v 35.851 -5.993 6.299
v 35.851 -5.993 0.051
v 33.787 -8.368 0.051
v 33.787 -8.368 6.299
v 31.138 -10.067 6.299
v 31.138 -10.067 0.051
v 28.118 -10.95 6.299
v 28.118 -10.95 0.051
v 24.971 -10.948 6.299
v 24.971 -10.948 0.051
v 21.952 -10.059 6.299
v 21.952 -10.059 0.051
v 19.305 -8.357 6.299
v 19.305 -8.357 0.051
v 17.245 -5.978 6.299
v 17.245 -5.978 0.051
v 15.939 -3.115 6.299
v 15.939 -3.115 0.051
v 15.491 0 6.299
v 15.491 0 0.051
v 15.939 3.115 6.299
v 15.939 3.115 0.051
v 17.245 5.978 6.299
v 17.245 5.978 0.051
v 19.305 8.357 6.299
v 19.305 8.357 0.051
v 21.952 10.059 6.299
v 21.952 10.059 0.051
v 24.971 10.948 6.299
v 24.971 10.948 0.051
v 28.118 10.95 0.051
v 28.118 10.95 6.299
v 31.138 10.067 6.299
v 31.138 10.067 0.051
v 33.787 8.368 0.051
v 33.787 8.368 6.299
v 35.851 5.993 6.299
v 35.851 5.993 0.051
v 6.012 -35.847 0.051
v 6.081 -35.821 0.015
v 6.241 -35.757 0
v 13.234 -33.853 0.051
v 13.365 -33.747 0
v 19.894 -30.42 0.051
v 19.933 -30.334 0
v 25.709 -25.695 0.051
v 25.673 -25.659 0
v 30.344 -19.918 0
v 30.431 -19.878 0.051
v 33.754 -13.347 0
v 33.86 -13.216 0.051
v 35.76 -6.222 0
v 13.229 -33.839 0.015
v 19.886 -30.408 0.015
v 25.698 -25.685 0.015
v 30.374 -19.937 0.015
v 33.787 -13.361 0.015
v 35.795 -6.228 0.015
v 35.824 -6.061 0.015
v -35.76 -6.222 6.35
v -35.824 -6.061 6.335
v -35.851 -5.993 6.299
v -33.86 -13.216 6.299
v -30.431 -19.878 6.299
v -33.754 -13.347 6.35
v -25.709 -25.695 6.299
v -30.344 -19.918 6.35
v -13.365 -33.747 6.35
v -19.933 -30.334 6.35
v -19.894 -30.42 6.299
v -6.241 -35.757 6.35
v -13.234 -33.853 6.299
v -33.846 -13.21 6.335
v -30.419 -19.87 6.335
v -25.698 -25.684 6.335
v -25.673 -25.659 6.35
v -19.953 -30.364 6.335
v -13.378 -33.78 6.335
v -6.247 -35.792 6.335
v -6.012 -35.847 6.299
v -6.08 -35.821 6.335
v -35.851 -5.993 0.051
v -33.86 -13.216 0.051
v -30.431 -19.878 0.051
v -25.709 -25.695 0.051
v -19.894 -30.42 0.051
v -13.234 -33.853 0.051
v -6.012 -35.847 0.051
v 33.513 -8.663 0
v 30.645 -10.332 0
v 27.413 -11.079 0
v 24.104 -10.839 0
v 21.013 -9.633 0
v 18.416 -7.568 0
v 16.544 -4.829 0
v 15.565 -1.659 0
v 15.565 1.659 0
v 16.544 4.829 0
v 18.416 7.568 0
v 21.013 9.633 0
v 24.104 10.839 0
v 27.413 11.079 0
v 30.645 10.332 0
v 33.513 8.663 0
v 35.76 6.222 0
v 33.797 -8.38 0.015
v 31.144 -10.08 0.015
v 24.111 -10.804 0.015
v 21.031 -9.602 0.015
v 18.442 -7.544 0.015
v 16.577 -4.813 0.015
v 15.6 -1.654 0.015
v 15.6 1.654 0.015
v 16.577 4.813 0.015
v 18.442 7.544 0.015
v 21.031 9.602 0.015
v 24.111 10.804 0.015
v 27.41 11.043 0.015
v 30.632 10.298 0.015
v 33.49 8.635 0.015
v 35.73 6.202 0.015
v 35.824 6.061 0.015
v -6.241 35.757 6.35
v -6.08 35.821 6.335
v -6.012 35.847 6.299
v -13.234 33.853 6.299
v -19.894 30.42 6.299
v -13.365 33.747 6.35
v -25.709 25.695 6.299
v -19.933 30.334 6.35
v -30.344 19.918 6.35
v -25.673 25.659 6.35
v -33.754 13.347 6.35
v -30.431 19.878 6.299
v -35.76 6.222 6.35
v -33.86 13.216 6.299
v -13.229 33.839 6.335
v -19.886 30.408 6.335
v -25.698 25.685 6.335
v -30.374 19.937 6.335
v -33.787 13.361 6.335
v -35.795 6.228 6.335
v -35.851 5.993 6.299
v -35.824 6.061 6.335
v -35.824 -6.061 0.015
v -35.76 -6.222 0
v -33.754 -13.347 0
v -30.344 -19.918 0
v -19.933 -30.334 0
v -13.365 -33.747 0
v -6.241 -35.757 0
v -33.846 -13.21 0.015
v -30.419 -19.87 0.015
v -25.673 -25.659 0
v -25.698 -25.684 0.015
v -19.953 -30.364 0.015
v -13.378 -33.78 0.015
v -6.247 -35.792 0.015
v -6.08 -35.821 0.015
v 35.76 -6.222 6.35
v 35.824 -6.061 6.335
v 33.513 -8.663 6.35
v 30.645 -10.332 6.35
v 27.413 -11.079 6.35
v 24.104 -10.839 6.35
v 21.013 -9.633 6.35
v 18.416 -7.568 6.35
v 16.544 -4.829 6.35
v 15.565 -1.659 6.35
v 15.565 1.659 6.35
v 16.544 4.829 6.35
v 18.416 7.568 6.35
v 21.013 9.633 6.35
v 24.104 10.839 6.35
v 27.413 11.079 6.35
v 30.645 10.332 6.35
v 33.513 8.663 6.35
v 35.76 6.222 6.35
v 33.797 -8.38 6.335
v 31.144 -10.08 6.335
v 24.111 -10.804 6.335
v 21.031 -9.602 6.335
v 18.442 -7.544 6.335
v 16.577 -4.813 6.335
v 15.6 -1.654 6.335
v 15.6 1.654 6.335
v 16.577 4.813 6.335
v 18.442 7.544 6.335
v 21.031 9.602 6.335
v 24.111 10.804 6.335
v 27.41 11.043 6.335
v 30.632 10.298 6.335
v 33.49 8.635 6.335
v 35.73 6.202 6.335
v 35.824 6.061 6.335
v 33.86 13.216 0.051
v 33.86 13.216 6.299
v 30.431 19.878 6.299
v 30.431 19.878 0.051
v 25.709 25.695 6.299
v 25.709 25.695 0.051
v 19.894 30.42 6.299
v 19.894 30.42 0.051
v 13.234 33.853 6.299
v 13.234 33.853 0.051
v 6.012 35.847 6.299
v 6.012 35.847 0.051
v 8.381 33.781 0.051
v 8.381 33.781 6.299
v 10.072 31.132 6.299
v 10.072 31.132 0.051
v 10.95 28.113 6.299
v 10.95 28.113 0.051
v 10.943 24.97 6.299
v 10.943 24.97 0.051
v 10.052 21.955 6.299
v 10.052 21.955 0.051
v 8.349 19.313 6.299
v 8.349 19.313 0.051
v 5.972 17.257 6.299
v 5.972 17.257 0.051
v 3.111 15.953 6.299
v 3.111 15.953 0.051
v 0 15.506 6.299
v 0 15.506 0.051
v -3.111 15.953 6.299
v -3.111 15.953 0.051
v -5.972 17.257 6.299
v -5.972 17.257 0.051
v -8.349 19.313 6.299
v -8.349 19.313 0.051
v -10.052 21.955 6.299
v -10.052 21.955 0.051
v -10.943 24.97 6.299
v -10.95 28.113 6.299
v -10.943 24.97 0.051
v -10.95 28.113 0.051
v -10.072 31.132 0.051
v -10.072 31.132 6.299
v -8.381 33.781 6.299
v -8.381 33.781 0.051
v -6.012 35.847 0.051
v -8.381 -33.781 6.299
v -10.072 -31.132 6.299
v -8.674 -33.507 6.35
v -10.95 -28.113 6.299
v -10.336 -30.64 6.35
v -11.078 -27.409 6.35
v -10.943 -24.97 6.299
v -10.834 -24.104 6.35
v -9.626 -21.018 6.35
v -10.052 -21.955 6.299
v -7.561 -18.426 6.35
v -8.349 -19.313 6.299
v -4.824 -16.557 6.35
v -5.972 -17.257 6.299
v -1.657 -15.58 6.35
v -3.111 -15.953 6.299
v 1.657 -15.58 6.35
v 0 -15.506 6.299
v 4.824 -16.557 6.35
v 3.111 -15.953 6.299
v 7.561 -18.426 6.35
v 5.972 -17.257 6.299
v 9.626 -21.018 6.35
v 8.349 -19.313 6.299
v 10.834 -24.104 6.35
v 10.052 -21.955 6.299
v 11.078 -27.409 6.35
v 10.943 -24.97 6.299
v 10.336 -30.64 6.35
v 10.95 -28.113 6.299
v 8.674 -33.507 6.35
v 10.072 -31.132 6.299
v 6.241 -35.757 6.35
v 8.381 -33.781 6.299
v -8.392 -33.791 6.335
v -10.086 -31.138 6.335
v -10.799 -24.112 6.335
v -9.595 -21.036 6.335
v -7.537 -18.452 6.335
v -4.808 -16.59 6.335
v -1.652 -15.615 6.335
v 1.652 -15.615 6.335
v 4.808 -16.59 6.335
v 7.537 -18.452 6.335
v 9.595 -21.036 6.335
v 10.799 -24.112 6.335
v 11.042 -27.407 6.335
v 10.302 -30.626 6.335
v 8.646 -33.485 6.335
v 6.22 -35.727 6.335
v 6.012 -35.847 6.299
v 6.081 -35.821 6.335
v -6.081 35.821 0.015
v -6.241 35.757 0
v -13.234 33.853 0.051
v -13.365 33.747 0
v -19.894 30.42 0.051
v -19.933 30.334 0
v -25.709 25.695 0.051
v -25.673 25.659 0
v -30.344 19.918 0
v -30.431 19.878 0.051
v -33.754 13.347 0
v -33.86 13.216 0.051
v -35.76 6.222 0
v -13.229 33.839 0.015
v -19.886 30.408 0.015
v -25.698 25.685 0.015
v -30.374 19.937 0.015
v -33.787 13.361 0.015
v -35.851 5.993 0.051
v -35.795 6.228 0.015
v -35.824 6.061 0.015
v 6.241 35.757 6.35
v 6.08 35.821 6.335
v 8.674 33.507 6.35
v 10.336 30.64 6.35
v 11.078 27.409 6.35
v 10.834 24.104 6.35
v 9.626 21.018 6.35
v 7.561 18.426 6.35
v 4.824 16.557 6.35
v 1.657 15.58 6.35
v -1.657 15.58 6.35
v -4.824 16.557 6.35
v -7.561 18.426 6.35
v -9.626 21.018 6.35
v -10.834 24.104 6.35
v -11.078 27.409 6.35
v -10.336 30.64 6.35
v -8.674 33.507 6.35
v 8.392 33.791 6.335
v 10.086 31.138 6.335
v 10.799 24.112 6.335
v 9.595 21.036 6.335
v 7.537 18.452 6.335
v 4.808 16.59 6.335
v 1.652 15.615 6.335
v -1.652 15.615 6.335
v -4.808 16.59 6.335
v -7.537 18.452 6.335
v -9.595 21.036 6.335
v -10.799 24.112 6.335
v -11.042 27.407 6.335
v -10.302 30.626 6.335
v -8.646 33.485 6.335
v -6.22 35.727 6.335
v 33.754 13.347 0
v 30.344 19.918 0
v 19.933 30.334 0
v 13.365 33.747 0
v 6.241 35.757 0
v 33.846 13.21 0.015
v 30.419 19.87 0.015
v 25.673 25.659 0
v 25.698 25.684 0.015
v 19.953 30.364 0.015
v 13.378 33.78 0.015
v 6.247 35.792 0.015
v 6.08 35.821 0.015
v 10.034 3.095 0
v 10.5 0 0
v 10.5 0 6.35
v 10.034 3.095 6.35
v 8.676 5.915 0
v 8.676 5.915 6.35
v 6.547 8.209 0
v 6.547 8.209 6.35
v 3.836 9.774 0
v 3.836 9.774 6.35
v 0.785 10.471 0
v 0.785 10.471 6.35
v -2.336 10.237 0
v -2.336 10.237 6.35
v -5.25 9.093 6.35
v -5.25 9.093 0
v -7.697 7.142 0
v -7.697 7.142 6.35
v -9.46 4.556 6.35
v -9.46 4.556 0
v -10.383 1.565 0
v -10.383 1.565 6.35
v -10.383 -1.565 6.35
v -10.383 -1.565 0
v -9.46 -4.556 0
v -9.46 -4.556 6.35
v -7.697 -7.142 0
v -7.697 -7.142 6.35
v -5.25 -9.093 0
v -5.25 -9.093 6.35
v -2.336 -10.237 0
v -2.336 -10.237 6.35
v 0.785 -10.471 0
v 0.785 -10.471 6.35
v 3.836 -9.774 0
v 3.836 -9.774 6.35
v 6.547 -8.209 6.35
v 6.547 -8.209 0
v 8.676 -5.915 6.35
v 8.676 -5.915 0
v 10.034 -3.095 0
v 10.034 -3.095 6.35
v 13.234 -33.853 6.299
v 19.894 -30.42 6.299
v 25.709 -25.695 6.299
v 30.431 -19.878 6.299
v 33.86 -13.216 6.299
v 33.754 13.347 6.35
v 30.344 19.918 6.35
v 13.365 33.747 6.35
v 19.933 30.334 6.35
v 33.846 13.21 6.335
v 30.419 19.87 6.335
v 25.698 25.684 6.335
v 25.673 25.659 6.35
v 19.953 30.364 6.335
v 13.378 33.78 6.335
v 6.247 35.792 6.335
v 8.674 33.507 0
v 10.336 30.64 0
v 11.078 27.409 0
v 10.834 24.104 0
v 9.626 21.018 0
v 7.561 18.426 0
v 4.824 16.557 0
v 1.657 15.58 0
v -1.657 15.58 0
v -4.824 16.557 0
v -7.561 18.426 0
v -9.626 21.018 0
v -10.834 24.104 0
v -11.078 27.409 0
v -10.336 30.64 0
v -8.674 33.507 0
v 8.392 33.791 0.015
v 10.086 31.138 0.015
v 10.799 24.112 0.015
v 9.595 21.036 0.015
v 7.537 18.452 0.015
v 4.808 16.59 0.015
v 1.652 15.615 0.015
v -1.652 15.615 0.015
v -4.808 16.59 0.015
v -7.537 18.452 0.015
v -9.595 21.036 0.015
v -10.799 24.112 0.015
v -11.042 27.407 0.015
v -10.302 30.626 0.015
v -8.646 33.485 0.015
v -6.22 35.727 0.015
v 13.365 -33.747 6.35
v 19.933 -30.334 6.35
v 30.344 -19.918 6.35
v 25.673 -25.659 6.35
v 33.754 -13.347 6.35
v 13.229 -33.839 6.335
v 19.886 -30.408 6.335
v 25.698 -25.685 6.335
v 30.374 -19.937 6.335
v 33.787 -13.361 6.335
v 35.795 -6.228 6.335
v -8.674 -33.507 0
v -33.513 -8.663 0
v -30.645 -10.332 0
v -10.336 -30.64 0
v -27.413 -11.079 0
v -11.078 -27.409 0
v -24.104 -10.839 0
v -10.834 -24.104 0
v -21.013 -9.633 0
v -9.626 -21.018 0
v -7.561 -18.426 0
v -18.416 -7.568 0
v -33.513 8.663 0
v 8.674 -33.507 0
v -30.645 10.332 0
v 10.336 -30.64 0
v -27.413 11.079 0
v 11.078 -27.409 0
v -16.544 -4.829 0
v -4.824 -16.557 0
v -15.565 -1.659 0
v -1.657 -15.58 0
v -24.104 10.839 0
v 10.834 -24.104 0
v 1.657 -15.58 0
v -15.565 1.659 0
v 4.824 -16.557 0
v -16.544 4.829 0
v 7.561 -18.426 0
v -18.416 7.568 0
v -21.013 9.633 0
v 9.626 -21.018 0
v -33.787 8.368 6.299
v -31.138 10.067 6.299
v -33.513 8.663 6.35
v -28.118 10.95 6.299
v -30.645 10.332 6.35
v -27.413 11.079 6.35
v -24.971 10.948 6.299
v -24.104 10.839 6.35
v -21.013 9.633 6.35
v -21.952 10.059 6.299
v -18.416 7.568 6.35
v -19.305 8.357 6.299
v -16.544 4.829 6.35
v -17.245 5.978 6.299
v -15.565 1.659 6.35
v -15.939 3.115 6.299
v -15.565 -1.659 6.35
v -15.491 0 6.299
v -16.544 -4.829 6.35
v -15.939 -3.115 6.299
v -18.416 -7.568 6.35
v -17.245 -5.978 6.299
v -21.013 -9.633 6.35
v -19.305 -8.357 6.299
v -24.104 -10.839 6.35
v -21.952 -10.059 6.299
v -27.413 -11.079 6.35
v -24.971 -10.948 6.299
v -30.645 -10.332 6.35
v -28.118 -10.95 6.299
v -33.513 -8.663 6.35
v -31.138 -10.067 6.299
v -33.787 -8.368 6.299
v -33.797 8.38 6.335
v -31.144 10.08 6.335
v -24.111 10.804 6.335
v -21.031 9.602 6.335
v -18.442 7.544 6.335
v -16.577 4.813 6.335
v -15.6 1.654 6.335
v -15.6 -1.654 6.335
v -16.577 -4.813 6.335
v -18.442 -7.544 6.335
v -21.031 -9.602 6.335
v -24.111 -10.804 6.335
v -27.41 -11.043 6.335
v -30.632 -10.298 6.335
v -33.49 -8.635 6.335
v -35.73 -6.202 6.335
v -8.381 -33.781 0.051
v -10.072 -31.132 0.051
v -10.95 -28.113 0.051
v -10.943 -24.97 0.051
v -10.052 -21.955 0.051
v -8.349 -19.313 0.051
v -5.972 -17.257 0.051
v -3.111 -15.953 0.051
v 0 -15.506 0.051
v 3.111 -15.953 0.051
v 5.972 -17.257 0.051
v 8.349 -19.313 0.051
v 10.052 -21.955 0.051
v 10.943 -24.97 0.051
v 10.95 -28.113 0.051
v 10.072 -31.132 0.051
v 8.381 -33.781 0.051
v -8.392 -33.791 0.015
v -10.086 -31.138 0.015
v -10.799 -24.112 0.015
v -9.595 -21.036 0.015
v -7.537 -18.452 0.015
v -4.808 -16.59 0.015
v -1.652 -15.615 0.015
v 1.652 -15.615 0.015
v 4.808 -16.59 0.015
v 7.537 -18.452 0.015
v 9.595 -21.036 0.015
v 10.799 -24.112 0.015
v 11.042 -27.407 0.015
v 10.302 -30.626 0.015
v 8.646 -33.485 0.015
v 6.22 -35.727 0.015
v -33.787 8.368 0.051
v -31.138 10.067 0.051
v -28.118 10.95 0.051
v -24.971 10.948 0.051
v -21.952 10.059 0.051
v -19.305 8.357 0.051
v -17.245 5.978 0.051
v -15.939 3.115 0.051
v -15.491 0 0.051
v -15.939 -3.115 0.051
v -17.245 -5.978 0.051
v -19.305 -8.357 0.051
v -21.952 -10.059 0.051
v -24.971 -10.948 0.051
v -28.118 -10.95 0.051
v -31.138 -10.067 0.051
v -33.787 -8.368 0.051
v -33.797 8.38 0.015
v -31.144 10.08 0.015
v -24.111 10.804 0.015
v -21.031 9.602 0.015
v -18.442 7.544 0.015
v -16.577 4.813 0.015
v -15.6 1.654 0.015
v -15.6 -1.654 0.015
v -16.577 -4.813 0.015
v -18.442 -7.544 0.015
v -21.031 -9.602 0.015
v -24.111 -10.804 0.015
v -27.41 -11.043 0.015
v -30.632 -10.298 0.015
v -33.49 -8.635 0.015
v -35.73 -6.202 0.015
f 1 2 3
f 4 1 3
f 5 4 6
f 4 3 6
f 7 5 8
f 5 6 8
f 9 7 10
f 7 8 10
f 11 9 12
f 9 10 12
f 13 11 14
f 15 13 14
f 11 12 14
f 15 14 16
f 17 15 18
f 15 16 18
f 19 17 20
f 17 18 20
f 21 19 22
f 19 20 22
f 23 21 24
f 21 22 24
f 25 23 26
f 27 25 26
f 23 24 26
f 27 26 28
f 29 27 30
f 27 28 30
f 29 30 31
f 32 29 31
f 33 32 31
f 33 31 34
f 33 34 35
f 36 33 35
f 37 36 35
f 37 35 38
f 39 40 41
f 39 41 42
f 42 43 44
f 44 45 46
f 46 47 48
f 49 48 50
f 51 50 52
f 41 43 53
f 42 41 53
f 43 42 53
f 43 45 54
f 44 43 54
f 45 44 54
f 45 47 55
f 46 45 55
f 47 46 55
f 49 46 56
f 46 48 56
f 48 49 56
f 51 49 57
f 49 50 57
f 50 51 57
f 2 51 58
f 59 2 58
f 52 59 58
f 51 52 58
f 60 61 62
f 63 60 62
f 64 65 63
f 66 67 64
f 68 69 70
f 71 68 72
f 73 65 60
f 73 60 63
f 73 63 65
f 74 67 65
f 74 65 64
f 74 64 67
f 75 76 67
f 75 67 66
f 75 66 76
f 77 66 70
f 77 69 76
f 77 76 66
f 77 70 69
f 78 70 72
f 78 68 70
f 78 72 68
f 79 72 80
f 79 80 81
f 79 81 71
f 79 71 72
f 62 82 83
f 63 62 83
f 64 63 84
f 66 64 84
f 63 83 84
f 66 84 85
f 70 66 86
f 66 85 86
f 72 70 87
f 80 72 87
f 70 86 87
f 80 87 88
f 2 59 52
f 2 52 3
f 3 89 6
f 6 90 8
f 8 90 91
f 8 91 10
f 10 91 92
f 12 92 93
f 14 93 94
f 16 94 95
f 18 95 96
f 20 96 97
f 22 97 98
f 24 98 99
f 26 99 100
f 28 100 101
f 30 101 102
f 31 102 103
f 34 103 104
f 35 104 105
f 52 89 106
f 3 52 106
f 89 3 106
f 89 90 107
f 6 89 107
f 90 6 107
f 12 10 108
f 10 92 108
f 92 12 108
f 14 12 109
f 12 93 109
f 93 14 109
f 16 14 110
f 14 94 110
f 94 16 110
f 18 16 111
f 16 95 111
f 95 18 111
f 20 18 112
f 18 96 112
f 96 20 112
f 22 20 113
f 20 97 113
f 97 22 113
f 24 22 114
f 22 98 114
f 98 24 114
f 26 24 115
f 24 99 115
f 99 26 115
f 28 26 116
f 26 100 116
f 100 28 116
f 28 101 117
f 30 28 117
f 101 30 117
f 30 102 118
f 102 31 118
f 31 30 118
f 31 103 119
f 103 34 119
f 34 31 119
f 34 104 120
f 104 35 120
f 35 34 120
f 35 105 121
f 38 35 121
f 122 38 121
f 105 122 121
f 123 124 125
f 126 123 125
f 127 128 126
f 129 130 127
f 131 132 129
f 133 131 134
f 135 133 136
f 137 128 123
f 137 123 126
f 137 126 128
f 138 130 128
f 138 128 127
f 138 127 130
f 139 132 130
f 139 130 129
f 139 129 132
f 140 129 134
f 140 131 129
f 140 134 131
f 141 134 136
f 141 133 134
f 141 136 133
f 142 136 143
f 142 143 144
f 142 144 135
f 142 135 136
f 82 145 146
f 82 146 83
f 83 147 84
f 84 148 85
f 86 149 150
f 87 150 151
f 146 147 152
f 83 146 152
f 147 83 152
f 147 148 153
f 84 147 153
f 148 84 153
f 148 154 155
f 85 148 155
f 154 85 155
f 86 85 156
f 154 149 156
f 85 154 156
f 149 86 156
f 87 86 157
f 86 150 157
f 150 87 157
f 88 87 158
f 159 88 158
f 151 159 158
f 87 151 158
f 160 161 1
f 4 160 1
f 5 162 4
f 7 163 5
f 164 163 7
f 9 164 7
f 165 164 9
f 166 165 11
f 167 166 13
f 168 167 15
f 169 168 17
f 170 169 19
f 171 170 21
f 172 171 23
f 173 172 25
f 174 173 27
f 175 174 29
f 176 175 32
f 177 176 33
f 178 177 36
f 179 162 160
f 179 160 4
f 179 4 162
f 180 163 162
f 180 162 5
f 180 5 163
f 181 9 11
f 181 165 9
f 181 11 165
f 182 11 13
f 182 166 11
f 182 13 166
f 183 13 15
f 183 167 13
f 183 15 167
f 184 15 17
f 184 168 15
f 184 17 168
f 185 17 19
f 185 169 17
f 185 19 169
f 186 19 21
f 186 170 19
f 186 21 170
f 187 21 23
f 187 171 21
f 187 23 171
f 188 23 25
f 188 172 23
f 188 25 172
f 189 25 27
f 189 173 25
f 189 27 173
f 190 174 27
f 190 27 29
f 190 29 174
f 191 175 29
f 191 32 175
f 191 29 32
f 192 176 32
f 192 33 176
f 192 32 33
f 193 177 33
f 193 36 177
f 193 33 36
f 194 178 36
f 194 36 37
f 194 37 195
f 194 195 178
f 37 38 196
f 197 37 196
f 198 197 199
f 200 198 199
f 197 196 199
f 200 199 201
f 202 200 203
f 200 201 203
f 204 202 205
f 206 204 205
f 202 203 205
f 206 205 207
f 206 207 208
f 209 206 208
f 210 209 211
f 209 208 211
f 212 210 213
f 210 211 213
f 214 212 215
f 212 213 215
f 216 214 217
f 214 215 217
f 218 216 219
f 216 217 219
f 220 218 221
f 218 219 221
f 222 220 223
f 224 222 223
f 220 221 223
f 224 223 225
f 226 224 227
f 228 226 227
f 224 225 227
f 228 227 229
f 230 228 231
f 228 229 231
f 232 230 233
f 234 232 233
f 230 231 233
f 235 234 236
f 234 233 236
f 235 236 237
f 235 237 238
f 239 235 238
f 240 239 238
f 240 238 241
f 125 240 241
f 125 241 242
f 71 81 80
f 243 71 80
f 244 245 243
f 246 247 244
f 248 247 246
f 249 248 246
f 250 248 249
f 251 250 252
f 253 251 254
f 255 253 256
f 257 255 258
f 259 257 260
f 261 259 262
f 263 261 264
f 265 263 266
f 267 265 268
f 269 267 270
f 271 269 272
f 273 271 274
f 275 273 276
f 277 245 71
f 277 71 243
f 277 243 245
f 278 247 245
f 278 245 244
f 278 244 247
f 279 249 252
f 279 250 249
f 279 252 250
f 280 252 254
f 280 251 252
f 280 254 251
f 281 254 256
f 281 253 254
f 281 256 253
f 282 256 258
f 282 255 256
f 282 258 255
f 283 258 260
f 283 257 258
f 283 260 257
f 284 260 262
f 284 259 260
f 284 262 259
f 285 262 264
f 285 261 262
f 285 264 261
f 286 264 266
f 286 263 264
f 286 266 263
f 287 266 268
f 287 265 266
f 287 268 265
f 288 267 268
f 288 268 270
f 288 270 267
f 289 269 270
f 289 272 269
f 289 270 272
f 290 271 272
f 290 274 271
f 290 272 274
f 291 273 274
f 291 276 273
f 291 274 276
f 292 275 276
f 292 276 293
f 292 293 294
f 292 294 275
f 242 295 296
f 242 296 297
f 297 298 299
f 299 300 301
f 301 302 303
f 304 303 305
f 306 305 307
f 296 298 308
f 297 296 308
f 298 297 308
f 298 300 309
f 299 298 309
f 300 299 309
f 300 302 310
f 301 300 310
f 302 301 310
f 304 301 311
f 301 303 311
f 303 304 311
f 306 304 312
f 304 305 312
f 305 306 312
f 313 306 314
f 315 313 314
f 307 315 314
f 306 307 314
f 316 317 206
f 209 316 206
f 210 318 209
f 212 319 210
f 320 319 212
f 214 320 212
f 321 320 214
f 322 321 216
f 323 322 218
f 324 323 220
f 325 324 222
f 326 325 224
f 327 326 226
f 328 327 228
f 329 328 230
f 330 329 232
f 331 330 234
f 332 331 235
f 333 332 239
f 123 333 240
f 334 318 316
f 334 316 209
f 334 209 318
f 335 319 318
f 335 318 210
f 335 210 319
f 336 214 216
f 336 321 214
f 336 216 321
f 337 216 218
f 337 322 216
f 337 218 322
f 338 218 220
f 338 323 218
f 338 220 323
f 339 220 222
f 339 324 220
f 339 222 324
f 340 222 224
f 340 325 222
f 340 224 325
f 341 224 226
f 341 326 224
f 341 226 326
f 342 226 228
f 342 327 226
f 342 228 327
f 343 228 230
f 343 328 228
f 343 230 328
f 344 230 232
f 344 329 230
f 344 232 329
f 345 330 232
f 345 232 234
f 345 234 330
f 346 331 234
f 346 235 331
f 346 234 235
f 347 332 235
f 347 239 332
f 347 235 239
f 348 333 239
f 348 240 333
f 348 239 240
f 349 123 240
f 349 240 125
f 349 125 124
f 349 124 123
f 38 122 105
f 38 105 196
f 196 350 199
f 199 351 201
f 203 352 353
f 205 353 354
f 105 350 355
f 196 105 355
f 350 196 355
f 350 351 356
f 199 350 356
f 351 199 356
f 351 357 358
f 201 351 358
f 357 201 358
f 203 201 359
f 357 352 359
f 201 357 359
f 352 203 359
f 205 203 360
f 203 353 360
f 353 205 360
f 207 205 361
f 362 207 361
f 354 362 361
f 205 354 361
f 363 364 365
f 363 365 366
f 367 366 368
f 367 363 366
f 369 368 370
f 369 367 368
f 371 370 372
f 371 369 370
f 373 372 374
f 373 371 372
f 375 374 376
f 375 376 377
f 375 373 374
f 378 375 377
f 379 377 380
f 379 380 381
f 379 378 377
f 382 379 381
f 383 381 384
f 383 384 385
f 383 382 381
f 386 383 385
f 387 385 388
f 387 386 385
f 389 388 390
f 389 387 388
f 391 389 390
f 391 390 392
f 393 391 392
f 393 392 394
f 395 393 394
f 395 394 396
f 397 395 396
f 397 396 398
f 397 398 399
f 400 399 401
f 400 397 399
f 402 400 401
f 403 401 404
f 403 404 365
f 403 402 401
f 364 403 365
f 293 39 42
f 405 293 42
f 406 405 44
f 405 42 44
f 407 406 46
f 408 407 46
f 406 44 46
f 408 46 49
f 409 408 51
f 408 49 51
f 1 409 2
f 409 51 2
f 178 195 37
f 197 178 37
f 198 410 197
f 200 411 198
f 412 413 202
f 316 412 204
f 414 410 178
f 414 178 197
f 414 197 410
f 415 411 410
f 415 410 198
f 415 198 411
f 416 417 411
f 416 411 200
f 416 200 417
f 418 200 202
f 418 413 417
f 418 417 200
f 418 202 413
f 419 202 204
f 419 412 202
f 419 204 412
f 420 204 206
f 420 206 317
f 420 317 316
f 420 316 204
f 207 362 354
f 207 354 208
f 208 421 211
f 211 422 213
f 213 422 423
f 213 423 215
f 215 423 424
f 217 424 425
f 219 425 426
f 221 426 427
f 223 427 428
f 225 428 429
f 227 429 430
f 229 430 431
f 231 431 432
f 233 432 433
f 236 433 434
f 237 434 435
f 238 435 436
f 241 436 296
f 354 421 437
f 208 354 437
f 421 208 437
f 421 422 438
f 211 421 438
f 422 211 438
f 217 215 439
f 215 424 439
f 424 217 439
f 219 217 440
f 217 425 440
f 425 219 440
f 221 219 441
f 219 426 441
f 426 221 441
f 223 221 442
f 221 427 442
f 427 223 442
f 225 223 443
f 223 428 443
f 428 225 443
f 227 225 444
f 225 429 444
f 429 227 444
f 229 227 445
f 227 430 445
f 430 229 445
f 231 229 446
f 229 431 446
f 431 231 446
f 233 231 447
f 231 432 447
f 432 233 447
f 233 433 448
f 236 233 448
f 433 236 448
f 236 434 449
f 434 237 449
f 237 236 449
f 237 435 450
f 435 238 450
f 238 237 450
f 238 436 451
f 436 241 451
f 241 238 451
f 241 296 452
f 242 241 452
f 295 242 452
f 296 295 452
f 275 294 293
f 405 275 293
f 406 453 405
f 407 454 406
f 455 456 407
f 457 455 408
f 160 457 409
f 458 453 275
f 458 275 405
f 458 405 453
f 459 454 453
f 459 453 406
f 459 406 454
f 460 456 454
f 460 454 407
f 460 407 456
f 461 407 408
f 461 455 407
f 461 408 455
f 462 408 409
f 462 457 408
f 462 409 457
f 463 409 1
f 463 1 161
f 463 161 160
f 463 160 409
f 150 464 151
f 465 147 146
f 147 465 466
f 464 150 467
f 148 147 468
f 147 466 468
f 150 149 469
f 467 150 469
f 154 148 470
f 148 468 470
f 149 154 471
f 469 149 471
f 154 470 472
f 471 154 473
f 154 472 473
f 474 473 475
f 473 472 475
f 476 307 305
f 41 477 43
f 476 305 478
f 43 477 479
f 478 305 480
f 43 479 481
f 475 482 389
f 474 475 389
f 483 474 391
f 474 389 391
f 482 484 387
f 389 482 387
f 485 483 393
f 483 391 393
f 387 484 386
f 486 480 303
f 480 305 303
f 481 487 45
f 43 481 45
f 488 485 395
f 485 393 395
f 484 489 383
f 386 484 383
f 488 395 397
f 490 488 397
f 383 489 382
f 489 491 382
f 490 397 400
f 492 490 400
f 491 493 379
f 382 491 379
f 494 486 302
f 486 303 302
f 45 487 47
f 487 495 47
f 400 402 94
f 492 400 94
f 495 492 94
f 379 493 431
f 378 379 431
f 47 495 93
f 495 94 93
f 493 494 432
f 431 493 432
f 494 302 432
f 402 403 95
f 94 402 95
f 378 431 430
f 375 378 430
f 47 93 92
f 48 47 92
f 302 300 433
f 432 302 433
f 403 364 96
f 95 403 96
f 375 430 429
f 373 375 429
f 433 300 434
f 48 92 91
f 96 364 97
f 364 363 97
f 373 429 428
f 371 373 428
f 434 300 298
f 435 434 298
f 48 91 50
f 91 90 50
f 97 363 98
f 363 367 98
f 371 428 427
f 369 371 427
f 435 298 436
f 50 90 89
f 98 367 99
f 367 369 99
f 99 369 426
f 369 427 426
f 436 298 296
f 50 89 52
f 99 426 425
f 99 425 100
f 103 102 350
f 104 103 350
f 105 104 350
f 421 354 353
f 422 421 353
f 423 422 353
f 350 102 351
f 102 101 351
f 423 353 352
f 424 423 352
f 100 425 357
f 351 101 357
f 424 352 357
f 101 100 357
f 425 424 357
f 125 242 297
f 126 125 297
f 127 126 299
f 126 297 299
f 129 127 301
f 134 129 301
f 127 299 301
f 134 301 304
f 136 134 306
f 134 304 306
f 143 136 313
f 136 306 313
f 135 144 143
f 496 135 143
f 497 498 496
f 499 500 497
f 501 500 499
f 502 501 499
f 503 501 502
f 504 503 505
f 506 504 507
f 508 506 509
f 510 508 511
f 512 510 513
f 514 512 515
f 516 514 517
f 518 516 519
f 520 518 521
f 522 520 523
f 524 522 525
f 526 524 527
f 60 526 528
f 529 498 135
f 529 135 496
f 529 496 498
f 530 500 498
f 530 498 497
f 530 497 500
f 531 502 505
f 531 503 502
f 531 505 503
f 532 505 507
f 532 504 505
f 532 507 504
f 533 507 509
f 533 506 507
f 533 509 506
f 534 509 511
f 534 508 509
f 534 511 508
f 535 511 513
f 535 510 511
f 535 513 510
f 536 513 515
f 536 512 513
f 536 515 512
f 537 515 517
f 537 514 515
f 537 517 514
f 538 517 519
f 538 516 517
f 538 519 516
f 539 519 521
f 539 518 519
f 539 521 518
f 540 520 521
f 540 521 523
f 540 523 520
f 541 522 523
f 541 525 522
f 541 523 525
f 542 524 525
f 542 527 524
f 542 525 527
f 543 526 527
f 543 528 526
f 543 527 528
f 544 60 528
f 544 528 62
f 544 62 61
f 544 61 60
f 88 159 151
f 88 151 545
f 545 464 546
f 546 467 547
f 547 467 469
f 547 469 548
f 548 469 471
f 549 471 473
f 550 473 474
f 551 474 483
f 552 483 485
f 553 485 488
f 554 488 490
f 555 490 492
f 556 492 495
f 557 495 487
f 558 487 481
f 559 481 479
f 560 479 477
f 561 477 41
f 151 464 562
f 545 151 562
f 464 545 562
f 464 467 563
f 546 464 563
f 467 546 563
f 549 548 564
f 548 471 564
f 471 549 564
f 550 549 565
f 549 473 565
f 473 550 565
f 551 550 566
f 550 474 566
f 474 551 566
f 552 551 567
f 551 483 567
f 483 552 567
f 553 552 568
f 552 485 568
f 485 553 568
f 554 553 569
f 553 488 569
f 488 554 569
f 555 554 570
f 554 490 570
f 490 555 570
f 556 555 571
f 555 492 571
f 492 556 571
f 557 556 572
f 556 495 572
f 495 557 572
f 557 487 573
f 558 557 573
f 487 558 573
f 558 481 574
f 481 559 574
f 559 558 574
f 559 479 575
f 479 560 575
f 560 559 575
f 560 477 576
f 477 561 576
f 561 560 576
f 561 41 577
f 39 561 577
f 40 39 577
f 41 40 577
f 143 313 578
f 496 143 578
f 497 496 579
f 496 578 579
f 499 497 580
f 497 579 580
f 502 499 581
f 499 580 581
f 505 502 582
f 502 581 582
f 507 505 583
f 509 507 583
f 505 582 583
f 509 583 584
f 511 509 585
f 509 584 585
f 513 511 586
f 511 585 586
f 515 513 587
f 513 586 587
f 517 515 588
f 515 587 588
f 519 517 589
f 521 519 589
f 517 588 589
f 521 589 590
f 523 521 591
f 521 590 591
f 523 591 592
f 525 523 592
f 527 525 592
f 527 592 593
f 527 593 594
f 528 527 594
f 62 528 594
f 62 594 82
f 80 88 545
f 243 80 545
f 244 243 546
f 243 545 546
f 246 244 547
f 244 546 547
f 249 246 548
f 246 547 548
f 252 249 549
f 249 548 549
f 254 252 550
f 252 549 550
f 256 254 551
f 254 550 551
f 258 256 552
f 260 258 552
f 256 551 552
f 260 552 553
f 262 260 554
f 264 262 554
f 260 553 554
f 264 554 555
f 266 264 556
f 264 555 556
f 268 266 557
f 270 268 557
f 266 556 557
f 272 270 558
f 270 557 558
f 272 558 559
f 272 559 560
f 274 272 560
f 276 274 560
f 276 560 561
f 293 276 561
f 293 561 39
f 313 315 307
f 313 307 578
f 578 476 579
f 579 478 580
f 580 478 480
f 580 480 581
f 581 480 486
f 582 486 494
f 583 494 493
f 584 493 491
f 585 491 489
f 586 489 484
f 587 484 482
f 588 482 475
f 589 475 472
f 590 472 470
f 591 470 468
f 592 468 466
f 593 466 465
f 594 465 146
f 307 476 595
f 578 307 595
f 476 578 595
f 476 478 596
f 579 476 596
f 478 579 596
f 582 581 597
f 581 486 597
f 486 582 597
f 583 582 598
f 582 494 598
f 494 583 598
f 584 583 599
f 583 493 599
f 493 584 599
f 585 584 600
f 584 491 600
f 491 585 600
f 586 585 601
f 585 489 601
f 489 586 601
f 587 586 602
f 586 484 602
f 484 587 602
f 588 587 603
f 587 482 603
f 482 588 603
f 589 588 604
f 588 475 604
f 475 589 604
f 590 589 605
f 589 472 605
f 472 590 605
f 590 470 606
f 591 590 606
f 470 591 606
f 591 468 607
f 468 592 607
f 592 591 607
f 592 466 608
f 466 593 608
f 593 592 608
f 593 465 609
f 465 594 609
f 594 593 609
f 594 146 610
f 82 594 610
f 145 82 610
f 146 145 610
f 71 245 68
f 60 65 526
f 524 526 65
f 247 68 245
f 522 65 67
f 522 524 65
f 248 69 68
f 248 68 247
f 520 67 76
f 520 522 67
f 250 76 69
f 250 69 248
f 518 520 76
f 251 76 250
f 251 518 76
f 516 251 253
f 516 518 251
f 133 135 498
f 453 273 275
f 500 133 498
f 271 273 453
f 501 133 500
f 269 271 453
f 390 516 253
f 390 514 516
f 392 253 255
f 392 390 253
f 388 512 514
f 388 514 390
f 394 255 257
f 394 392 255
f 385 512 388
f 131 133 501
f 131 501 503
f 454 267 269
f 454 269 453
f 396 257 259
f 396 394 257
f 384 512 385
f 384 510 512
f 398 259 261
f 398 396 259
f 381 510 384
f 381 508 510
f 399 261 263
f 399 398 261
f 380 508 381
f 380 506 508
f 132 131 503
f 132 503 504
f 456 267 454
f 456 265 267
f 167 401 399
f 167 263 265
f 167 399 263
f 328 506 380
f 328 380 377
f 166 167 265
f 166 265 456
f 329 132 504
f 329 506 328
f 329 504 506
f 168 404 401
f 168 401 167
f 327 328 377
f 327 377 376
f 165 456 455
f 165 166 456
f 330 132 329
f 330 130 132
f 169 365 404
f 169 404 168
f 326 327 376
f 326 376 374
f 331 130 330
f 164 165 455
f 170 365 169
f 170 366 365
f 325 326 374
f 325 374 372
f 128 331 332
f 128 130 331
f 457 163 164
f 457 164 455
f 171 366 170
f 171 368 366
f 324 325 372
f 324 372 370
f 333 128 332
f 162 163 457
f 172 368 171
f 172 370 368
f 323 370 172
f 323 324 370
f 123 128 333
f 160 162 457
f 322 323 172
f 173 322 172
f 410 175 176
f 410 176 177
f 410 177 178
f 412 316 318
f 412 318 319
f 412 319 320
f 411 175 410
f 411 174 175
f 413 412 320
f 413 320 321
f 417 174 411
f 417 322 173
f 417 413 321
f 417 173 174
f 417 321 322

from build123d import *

# Parameters (mm, degrees)
F0_R     = 10.5
F1_DEPTH = 6.35
F2_R     = 0.0508


with BuildPart() as f1:
    # F0 (on Top) → F1 (new body)
    with BuildSketch(Plane.XY):
        with BuildLine():
            ThreePointArc((-35.850693, 5.992529), (-15.4911, 0), (-35.850693, -5.992529))
            ThreePointArc((-35.850693, -5.992529), (-25.708936, -25.695003), (-6.011962, -35.847439))
            ThreePointArc((-6.011962, -35.847439), (0, -15.50641), (6.011962, -35.847439))
            ThreePointArc((6.011962, -35.847439), (25.708936, -25.695003), (35.850693, -5.992529))
            ThreePointArc((35.850693, -5.992529), (15.4911, 0), (35.850693, 5.992529))
            ThreePointArc((35.850693, 5.992529), (25.708936, 25.695003), (6.011962, 35.847439))
            ThreePointArc((6.011962, 35.847439), (0, 15.50641), (-6.011962, 35.847439))
            ThreePointArc((-6.011962, 35.847439), (-25.708936, 25.695003), (-35.850693, 5.992529))
        make_face()
        Circle(F0_R, mode=Mode.SUBTRACT)
    extrude(amount=F1_DEPTH)

    # F2
    f2_edges = [f1.edges().sort_by_distance(p)[0] for p in [
        (-25.708936, 25.695003, 0),
        (25.708936, 25.695003, 0),
        (25.708936, -25.695003, 0),
        (0, -15.50641, 0),
        (15.4911, 0, 0),
        (0, 15.50641, 0),
        (-15.4911, 0, 0),
        (-25.708936, -25.695003, 0),
        (-25.708936, -25.695003, 6.35),
        (-25.708936, 25.695003, 6.35),
        (25.708936, 25.695003, 6.35),
        (15.4911, 0, 6.35),
        (0, 15.50641, 6.35),
        (-15.4911, 0, 6.35),
        (0, -15.50641, 6.35),
        (25.708936, -25.695003, 6.35),
    ]]
    fillet(f2_edges, radius=F2_R)


solid = f1.part
